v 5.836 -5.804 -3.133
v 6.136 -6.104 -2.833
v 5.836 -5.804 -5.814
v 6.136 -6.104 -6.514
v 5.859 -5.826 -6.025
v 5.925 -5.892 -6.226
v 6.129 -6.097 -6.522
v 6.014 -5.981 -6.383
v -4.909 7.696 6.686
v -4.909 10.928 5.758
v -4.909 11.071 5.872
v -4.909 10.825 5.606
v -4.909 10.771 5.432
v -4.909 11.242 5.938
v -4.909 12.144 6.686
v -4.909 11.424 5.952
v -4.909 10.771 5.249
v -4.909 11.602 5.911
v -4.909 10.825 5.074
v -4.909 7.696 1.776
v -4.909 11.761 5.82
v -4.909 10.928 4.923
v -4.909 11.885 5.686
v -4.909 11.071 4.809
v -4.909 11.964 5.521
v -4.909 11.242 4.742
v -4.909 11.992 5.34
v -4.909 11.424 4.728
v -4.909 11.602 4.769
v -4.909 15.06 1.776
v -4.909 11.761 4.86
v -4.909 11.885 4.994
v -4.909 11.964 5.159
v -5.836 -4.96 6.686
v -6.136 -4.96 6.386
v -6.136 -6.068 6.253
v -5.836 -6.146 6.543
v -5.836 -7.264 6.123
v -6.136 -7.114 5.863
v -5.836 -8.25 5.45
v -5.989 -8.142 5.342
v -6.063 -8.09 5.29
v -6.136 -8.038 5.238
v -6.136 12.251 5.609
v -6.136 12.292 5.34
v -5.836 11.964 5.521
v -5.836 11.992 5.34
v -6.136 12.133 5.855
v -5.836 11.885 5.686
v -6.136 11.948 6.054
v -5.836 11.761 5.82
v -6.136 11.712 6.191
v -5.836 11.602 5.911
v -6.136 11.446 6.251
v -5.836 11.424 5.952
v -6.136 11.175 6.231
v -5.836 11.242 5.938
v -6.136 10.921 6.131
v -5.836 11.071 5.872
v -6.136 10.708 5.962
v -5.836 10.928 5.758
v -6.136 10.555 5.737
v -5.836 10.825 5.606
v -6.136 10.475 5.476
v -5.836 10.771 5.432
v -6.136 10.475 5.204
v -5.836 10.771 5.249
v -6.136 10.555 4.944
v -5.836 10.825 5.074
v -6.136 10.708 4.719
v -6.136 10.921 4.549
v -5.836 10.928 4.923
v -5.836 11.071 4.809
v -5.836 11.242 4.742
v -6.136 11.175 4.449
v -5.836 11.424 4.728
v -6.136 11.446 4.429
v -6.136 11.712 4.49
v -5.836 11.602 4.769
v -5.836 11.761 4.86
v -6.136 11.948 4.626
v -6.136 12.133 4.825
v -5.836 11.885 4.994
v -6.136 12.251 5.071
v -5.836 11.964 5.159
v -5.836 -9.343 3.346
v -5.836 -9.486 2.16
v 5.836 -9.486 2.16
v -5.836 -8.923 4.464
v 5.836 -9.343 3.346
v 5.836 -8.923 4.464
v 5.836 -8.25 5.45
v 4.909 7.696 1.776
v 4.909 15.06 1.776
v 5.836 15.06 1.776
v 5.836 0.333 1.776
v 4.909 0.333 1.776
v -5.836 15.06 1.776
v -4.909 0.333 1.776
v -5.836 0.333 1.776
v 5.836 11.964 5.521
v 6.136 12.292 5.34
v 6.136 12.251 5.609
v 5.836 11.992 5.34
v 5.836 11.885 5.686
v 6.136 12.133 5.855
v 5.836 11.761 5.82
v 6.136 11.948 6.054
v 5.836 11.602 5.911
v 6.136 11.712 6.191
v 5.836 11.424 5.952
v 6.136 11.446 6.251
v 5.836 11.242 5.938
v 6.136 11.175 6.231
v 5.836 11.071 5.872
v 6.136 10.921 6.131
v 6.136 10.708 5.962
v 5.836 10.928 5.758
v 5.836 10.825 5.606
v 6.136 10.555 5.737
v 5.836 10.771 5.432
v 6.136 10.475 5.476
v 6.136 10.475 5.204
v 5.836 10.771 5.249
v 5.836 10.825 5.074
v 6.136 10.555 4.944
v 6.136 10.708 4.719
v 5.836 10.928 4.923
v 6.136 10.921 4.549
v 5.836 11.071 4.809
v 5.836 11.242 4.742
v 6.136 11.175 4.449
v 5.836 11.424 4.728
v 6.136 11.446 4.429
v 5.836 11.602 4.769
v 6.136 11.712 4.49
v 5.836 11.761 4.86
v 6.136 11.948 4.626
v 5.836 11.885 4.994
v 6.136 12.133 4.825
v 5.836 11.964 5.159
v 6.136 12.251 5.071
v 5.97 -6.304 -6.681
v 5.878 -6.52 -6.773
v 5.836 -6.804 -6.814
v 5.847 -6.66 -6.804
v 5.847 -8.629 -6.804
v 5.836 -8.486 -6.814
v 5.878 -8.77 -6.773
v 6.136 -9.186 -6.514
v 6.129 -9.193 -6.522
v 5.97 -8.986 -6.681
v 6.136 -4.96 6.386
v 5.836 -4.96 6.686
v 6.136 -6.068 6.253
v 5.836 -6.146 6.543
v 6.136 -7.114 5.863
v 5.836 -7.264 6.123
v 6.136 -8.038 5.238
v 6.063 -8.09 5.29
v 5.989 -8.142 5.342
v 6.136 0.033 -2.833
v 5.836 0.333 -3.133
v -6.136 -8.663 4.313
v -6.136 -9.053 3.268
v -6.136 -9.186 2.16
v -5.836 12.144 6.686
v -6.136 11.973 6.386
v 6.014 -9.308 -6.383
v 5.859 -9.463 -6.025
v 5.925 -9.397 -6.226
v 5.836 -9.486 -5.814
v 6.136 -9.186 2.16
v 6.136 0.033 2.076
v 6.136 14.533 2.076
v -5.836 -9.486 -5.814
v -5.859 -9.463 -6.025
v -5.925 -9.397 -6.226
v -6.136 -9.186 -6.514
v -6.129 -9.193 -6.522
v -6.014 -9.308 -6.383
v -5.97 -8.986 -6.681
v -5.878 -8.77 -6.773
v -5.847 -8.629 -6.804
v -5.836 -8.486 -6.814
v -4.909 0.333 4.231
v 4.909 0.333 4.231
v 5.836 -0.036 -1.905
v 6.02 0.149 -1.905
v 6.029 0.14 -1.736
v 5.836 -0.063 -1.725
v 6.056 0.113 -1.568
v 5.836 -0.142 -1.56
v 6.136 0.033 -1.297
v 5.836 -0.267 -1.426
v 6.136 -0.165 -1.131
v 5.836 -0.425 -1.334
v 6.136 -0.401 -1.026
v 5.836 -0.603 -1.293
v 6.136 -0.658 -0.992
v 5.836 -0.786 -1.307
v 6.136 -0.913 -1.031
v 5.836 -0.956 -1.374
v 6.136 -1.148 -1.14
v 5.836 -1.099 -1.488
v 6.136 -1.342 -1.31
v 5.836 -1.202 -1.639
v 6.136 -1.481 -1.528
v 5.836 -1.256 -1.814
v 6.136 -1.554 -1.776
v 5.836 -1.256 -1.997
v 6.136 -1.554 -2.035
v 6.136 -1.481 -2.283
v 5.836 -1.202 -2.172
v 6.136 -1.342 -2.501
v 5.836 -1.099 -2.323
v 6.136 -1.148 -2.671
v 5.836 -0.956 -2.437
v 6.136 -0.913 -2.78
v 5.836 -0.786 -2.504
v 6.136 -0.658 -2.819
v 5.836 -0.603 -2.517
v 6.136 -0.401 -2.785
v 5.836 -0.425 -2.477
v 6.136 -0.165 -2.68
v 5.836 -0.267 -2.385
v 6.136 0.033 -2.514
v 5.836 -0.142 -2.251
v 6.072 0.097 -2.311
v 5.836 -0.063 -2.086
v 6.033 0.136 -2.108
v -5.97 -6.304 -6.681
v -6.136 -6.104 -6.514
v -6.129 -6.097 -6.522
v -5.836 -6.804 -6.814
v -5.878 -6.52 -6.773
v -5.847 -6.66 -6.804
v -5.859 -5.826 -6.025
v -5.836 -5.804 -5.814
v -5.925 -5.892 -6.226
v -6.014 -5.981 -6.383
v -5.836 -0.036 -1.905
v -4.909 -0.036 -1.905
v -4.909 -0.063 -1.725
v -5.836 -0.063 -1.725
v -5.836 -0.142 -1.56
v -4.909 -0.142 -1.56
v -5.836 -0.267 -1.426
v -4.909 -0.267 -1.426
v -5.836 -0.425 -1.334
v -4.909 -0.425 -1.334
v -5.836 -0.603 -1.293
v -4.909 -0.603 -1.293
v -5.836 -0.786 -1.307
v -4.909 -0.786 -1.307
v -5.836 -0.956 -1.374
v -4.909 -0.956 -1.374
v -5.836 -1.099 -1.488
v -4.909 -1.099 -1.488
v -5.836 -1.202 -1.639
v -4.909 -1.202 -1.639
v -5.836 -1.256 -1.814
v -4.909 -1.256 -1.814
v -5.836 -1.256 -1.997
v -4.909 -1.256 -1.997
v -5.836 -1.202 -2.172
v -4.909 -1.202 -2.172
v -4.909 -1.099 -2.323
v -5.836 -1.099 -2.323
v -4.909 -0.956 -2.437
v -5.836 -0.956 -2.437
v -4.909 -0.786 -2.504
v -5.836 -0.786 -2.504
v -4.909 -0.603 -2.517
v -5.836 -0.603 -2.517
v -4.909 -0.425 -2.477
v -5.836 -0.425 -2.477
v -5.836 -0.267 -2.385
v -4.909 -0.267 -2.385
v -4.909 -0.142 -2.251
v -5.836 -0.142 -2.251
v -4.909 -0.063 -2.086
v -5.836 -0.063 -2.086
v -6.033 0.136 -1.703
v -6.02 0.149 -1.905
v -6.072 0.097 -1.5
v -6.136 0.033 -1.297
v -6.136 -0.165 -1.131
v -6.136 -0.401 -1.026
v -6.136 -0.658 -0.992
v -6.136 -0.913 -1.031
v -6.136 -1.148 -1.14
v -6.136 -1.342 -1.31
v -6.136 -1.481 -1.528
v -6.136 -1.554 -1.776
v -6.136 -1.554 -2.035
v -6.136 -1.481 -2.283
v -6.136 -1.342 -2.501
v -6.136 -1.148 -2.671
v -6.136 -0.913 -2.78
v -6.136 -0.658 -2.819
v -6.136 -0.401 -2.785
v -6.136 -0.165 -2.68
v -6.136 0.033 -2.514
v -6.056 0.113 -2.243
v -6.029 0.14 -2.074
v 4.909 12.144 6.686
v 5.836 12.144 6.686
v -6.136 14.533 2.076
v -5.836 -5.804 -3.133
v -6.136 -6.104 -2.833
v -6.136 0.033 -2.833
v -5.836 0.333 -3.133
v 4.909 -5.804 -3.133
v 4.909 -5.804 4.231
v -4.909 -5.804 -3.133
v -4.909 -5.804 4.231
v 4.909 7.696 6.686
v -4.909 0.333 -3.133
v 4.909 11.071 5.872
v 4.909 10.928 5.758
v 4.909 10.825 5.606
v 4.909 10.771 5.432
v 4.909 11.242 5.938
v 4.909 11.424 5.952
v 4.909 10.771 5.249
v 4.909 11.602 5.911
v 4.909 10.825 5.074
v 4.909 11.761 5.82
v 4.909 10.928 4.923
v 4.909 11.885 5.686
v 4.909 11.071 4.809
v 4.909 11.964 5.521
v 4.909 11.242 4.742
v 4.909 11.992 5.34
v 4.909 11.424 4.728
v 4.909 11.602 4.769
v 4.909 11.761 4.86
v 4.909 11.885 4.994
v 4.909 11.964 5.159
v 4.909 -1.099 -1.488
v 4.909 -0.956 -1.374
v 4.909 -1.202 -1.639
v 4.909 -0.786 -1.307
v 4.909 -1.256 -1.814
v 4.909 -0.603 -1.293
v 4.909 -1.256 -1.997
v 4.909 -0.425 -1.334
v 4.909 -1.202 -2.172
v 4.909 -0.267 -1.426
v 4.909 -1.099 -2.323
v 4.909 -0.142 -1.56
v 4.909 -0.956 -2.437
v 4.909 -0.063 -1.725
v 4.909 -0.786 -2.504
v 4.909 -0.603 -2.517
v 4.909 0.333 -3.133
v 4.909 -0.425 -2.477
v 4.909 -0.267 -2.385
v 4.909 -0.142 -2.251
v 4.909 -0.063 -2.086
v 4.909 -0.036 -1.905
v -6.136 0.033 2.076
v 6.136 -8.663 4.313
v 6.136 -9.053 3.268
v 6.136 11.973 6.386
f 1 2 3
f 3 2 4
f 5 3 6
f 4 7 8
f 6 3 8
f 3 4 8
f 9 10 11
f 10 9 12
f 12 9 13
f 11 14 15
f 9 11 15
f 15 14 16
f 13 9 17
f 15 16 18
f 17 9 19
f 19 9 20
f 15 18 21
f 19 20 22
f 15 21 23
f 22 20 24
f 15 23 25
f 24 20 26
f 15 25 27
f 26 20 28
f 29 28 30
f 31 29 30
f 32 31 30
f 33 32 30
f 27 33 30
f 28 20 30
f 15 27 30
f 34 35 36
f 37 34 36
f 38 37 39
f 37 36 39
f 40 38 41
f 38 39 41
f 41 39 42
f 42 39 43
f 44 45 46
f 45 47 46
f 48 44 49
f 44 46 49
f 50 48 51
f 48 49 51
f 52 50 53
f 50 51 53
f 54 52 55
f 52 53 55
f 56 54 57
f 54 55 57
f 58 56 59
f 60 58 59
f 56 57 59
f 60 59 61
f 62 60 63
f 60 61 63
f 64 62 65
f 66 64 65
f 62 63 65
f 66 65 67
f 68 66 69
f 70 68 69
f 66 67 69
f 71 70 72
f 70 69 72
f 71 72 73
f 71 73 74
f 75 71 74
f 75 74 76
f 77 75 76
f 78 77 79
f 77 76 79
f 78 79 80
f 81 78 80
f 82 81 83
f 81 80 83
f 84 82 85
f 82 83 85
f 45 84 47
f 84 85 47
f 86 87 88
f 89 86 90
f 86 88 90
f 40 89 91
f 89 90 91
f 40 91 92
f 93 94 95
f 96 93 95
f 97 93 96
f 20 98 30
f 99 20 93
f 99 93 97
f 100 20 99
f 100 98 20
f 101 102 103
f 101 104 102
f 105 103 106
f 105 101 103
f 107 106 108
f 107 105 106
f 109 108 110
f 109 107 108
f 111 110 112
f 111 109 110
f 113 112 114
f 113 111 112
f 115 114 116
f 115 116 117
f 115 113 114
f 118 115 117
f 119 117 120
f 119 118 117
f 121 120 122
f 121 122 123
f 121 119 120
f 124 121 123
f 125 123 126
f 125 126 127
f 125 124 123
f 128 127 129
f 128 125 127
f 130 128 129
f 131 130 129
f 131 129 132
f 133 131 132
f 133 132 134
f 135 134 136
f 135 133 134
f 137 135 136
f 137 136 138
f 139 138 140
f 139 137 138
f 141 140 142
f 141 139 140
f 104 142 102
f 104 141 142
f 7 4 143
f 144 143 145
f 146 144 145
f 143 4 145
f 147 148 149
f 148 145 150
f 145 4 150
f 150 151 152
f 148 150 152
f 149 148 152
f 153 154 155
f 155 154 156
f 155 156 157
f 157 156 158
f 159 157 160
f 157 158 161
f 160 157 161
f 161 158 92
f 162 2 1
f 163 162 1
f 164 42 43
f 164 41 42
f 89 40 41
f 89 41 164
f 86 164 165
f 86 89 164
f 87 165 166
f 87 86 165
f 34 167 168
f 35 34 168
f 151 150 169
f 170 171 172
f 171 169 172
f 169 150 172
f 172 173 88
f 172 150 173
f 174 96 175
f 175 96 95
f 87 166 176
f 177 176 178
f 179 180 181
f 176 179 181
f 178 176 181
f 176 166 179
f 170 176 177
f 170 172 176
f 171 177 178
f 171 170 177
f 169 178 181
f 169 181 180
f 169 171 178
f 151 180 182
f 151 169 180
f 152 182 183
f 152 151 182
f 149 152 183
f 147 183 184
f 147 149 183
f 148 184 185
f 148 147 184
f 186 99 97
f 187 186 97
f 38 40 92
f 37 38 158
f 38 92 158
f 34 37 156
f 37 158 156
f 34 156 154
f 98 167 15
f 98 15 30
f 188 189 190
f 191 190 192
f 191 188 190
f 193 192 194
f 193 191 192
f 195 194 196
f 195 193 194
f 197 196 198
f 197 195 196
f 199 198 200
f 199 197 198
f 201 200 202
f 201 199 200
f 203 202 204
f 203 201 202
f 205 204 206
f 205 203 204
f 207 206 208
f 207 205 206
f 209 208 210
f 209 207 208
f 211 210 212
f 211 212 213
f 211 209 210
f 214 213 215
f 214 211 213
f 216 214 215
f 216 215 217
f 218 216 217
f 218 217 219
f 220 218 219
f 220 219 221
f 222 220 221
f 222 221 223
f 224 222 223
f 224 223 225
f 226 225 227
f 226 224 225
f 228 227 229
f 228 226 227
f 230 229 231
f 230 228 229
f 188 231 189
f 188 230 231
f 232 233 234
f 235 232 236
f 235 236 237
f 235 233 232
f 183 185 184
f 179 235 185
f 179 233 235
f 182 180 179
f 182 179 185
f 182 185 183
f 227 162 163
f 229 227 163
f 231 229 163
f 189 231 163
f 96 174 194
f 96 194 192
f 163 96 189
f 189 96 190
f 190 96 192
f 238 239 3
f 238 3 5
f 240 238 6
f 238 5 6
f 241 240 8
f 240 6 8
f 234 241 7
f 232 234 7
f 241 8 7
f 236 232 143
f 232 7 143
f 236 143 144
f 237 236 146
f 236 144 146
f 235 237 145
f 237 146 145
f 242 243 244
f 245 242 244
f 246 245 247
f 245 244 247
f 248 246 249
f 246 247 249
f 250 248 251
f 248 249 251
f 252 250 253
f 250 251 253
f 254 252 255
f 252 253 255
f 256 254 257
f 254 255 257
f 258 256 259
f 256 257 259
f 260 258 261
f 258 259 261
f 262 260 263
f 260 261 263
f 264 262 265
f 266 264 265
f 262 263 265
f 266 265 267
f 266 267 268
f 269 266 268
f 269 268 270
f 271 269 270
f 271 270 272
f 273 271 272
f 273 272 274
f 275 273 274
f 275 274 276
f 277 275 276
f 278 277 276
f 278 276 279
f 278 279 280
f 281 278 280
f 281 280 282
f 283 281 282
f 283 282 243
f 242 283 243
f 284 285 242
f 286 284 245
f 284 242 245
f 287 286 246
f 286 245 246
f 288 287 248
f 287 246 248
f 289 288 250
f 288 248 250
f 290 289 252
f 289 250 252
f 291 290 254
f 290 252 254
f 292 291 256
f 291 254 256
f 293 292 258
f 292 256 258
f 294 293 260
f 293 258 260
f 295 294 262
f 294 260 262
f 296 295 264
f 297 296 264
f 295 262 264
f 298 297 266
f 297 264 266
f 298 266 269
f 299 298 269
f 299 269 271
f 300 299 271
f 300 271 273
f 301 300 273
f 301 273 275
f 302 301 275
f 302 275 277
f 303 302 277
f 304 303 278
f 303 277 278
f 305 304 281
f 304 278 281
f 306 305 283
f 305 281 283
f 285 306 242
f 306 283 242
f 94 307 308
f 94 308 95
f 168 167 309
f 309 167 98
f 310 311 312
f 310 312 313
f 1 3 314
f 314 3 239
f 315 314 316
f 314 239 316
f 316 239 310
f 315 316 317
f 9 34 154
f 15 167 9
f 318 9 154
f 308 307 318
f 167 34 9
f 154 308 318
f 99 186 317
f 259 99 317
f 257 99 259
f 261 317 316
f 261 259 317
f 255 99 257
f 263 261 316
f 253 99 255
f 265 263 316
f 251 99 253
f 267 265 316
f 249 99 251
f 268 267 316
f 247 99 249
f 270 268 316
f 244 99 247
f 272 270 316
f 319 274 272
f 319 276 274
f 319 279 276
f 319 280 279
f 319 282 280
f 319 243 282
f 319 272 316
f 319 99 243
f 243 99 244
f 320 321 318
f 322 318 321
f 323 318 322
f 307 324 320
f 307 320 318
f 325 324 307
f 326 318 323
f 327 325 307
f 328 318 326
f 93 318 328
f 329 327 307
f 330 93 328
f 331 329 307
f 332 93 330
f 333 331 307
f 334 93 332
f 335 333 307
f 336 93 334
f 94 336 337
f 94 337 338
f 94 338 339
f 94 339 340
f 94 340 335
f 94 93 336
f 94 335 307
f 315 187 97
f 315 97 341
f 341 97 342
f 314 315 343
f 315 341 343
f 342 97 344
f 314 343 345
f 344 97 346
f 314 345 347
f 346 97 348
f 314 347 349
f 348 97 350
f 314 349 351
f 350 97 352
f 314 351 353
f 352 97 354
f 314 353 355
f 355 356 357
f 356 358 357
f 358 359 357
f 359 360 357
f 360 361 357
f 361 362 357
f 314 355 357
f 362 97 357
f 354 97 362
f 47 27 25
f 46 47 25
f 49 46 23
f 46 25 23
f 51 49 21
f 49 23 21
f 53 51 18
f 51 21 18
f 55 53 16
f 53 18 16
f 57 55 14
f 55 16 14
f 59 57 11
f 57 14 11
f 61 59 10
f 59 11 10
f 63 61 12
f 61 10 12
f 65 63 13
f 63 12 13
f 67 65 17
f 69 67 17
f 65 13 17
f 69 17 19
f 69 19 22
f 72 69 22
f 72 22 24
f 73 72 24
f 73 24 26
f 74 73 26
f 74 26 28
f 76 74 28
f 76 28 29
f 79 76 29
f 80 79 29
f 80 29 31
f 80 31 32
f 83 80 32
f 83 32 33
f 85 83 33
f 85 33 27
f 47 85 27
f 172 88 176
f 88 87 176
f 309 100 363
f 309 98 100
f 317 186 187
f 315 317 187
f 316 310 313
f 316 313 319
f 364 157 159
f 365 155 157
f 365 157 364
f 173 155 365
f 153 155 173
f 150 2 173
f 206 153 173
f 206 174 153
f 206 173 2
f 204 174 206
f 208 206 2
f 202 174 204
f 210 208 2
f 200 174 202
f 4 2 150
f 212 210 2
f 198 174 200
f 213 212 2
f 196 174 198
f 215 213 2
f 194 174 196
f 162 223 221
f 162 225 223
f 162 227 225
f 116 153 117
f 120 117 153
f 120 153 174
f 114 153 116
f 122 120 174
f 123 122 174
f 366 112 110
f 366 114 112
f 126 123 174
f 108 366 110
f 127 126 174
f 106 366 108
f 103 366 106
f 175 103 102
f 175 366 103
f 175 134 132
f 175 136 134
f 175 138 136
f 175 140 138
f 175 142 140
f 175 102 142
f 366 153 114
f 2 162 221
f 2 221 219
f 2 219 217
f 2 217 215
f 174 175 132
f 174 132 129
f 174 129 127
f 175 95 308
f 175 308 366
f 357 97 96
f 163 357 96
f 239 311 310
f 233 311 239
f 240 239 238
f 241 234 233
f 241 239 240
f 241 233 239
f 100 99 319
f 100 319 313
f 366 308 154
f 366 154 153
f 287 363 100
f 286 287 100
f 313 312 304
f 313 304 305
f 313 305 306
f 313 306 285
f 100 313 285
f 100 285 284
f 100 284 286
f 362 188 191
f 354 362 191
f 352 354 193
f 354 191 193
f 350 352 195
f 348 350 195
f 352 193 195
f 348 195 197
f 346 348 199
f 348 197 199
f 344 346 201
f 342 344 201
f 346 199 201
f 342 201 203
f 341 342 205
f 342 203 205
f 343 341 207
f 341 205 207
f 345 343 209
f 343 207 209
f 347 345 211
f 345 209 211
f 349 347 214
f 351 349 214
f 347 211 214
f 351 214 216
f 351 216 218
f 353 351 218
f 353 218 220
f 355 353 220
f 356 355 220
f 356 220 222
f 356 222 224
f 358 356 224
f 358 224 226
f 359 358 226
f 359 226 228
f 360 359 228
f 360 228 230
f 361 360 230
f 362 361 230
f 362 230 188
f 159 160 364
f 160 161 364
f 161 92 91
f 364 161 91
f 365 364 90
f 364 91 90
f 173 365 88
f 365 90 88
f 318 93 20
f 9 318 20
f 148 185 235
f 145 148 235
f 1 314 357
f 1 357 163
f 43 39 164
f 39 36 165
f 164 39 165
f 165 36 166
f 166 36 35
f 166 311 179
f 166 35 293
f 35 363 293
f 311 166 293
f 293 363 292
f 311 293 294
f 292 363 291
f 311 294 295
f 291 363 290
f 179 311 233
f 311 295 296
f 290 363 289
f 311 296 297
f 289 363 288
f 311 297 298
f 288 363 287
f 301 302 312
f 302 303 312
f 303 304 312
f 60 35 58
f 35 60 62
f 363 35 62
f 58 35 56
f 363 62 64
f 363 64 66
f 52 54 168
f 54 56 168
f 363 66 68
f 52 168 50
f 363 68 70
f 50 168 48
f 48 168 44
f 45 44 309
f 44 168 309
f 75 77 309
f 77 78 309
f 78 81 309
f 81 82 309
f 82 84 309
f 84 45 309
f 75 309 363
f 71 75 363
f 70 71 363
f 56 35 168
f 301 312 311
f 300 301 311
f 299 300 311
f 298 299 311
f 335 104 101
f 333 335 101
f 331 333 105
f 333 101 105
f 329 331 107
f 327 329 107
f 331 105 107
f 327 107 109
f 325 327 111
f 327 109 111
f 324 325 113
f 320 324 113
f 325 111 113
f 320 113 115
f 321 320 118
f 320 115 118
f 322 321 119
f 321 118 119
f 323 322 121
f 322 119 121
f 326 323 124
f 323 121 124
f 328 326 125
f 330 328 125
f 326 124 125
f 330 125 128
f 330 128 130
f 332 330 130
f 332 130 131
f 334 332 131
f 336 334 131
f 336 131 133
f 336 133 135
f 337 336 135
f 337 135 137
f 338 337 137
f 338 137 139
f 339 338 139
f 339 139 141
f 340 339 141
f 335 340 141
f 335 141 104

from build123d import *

# Parameters (mm, degrees)
SKETCH_1_W                = 5
SKETCH_1_H                = 10
EXTRUDE_1_DEPTH           = 4
CUT_EXTRUDE_1_DEPTH       = 9.124038405
CUT_EXTRUDE_1_DEPTH_BACK  = 9.124038405
CUT_EXTRUDE_2_DEPTH       = 9.124038405
CUT_EXTRUDE_2_DEPTH_BACK  = 9.124038405
SKETCH_6_W                = 4
SKETCH_6_H                = 3
CUT_EXTRUDE_3_DEPTH       = 2.5
SKETCH_7_W                = 4
SKETCH_7_H                = 3
CUT_EXTRUDE_4_DEPTH       = 2.5
CUT_EXTRUDE_5_DEPTH       = 9.124038405
CUT_EXTRUDE_5_DEPTH_BACK  = 9.124038405
CUT_EXTRUDE_10_DEPTH      = 9.124038405
CUT_EXTRUDE_10_DEPTH_BACK = 5
SKETCH_11_R               = 0.25
CUT_EXTRUDE_11_DEPTH      = 5
SKETCH_12_R               = 0.25
CUT_EXTRUDE_12_DEPTH      = 5
EXTRUDE_3_DEPTH           = 5
SCALE_1_SCALE             = 2.454545455
FILLET_1_R                = 5
CHAMFER_1_SIZE            = 0.3
FILLET_2_R                = 1


with BuildPart() as part:
    # 草图1 → 凸台-拉伸1 (new body)
    with BuildSketch(Plane.XY):
        Rectangle(SKETCH_1_W, SKETCH_1_H)
    extrude(amount=EXTRUDE_1_DEPTH)

    # 草图2 → 切除-拉伸1 (cut, two sides: drawn at the far end of the back side and taken through both)
    with BuildSketch(Plane(origin=(2.5, 0, 0), x_dir=(0, 0, -1), z_dir=(1, 0, 0)).offset(-CUT_EXTRUDE_1_DEPTH_BACK)):
        Polygon((-30.132775887, -11.712260262), (-4, 3.811901084), (-2, 5), (24.132775887, 20.524161347), (-6.915546806, 72.789713121), (-61.181098581, 40.553291512), align=None)
    extrude(amount=CUT_EXTRUDE_1_DEPTH + CUT_EXTRUDE_1_DEPTH_BACK, mode=Mode.SUBTRACT)

    # 草图3 → 切除-拉伸2 (cut, two sides: drawn at the far end of the back side and taken through both)
    with BuildSketch(Plane(origin=(2.5, 0, 0), x_dir=(0, 0, -1), z_dir=(1, 0, 0)).offset(-CUT_EXTRUDE_2_DEPTH_BACK)):
        Polygon((-2, 35.396078054), (-2, 5), (-2, -1), (0, -1), (30.396078054, -1), (75.805427436, 39.418773275), (43.409349382, 75.814851329), align=None)
    extrude(amount=CUT_EXTRUDE_2_DEPTH + CUT_EXTRUDE_2_DEPTH_BACK, mode=Mode.SUBTRACT)

    # 草图6 → 切除-拉伸3 (cut)
    with BuildSketch(Plane(origin=(0, -1, 0), x_dir=(1, 0, 0), z_dir=(0, 1, 0))):
        with Locations((0, -1.5)):
            Rectangle(SKETCH_6_W, SKETCH_6_H)
    extrude(amount=-CUT_EXTRUDE_3_DEPTH, mode=Mode.SUBTRACT)

    # 草图7 → 切除-拉伸4 (cut)
    with BuildSketch(Plane(origin=(0, 0, 2), x_dir=(-1, 0, 0), z_dir=(0, 0, -1))):
        with Locations((0, 3.5)):
            Rectangle(SKETCH_7_W, SKETCH_7_H)
    extrude(amount=-CUT_EXTRUDE_4_DEPTH, mode=Mode.SUBTRACT)

    # 草图8 → 切除-拉伸5 (cut, two sides: drawn at the far end of the back side and taken through both)
    with BuildSketch(Plane(origin=(2.5, 0, 0), x_dir=(0, 0, -1), z_dir=(1, 0, 0)).offset(-CUT_EXTRUDE_5_DEPTH_BACK)):
        Polygon((-25.835890872, 17.835890872), (-4, -4), (-3, -5), (18.835890872, -26.835890872), (-24.835890872, -70.507672616), (-69.507672616, -25.835890872), align=None)
    extrude(amount=CUT_EXTRUDE_5_DEPTH + CUT_EXTRUDE_5_DEPTH_BACK, mode=Mode.SUBTRACT)

    # 草图9 → 切除-拉伸10 (cut, two sides: drawn at the far end of the back side and taken through both)
    with BuildSketch(Plane(origin=(2.5, 0, 0), x_dir=(0, 0, -1), z_dir=(1, 0, 0)).offset(-CUT_EXTRUDE_10_DEPTH_BACK)):
        Polygon((-23.148447549, -26.648447549), (-1.5, -5), (0, -3.5), (21.648447549, 18.148447549), (64.945342647, -25.148447549), (20.148447549, -69.945342647), align=None)
    extrude(amount=CUT_EXTRUDE_10_DEPTH + CUT_EXTRUDE_10_DEPTH_BACK, mode=Mode.SUBTRACT)

    # 草图11 → 切除-拉伸11 (cut)
    with BuildSketch(Plane(origin=(2.5, 0, 0), x_dir=(0, 0, -1), z_dir=(1, 0, 0))):
        with Locations(Location((-3.451895846, 3.5, 0), (0, 0, 90))):
            Circle(SKETCH_11_R)
    extrude(amount=-CUT_EXTRUDE_11_DEPTH, mode=Mode.SUBTRACT)

    # 草图12 → 切除-拉伸12 (cut)
    with BuildSketch(Plane(origin=(2.5, 0, 0), x_dir=(0, 0, -1), z_dir=(1, 0, 0))):
        with Locations(Location((-0.5, -1.4, 0), (0, 0, 90))):
            Circle(SKETCH_12_R)
    extrude(amount=-CUT_EXTRUDE_12_DEPTH, mode=Mode.SUBTRACT)

    # 草图14 → 凸台-拉伸3 (add)
    with BuildSketch(Plane.ZY.offset(2.5)):
        Polygon((1.5, -5), (-1.5, -5), (-1.5, -3.5), (0, -3.5), align=None)
    extrude(amount=-EXTRUDE_3_DEPTH)


with BuildPart() as part_1:
    # 缩放比例1: scaled about (0, -1.916171136, 2.153711166)
    add(part.part.scale(SCALE_1_SCALE).moved(Location((0, 2.787158016, -3.132670787))))

    # 圆角1
    # the kernel refuses this fillet: 5 mm, written as the material it takes off along each edge
    with BuildSketch(Plane(origin=(11.314033166, -9.485569257, 4.230965577), x_dir=(0, 0.7071067811865475, 0.7071067811865475), z_dir=(-1, 0, 0))) as fillet_1_piece_1:
        with BuildLine():
            CenterArc((FILLET_1_R * 0.414213562373, FILLET_1_R), FILLET_1_R, 225, 45)
            Line((-FILLET_1_R * 0.292893218813, FILLET_1_R * 0.292893218813), (0, 0))
            Line((0, 0), (FILLET_1_R * 0.414213562373, 0))
        make_face()
    extrude(amount=22.628066332, mode=Mode.SUBTRACT)
    with BuildSketch(Plane(origin=(11.314033166, -7.031023802, 6.685511031), x_dir=(0, -0.7071067811865476, -0.7071067811865476), z_dir=(-1, 0, 0))) as fillet_1_piece_2:
        with BuildLine():
            CenterArc((FILLET_1_R * 0.414213562373, -FILLET_1_R), FILLET_1_R, 90, 45)
            Line((-FILLET_1_R * 0.292893218813, -FILLET_1_R * 0.292893218813), (0, 0))
            Line((0, 0), (FILLET_1_R * 0.414213562373, 0))
        make_face()
    extrude(amount=22.628066332, mode=Mode.SUBTRACT)

    # 倒角1
    # the kernel refuses this chamfer: 0.3 mm, written as the material it takes off along each edge
    with BuildSketch(Plane(origin=(6.136363636, -4.95995599, 6.685511031), x_dir=(-0.9996219169112968, 0, 0.027495876610587344), z_dir=(0, 1, 0)), Plane(origin=(-6.136363636, 12.915147392, 6.685511031), x_dir=(0.9996219169112968, 0, 0.027495876610587344), z_dir=(0, -1, 0))) as chamfer_1_piece_1:
        Polygon((CHAMFER_1_SIZE * 0.999621916911, -CHAMFER_1_SIZE * 0.0274958766106), (-CHAMFER_1_SIZE * 0.0274958766106, -CHAMFER_1_SIZE * 0.999621916911), (0, 0), align=None)
    extrude(amount=17.875103383, mode=Mode.SUBTRACT)
    with BuildSketch(Plane(origin=(6.136363636, 15.831390185, 1.776420122), x_dir=(-0.9996219169112968, 0, -0.027495876610586622), z_dir=(0, -1, 0)), Plane(origin=(-6.136363636, 0.332612561, 1.776420122), x_dir=(0.9996219169112965, 0, -0.027495876610589495), z_dir=(0, 1, 0))) as chamfer_1_piece_2:
        Polygon((CHAMFER_1_SIZE * 0.999621916911, -CHAMFER_1_SIZE * 0.0274958766106), (-CHAMFER_1_SIZE * 0.0274958766106, -CHAMFER_1_SIZE * 0.999621916911), (0, 0), align=None)
    extrude(amount=15.498777624, mode=Mode.SUBTRACT)
    with BuildSketch(Plane(origin=(6.136363636, 0.332612561, 1.776420122), x_dir=(0.02749587661059016, -0.9996219169112965, 0), z_dir=(0, 0, -1)), Plane(origin=(-6.136363636, 0.332612561, -3.904175683), x_dir=(-0.027495876610587448, -0.9996219169112968, 0), z_dir=(0, 0, 1))) as chamfer_1_piece_3:
        Polygon((CHAMFER_1_SIZE * 0.999621916911, CHAMFER_1_SIZE * 0.0274958766106), (-CHAMFER_1_SIZE * 0.0274958766106, CHAMFER_1_SIZE * 0.999621916911), (0, 0), align=None)
    extrude(amount=5.680595805, mode=Mode.SUBTRACT)
    with BuildSketch(Plane(origin=(6.136363636, -5.803751075, -3.132670787), x_dir=(0.027495876610587378, 0, 0.9996219169112965), z_dir=(0, 1, 0)), Plane(origin=(-6.136363636, 1.104117458, -3.132670787), x_dir=(-0.027495876610587378, 0, 0.9996219169112965), z_dir=(0, -1, 0))) as chamfer_1_piece_4:
        Polygon((CHAMFER_1_SIZE * 0.999621916911, -CHAMFER_1_SIZE * 0.0274958766106), (-CHAMFER_1_SIZE * 0.0274958766106, -CHAMFER_1_SIZE * 0.999621916911), (0, 0), align=None)
    extrude(amount=6.907868533, mode=Mode.SUBTRACT)
    with BuildSketch(Plane(origin=(-6.136363636, -5.803751075, -7.585993865), x_dir=(-0.027495876610587264, -0.9996219169112968, 0), z_dir=(0, 0, 1))) as chamfer_1_piece_5:
        Polygon((CHAMFER_1_SIZE * 0.999621916911, CHAMFER_1_SIZE * 0.0274958766106), (-CHAMFER_1_SIZE * 0.0274958766106, CHAMFER_1_SIZE * 0.999621916911), (0, 0), align=None)
    extrude(amount=4.453323078, mode=Mode.SUBTRACT)
    with BuildSketch(Plane(origin=(6.136363636, -5.803751075, -7.585993865), x_dir=(0.027495876610587264, -0.9996219169112968, 0), z_dir=(0, 0, 1))) as chamfer_1_piece_6:
        Polygon((CHAMFER_1_SIZE * 0.999621916911, -CHAMFER_1_SIZE * 0.0274958766106), (-CHAMFER_1_SIZE * 0.0274958766106, -CHAMFER_1_SIZE * 0.999621916911), (0, 0), align=None)
    extrude(amount=4.453323078, mode=Mode.SUBTRACT)
    with BuildSketch(Plane(origin=(-6.136363636, -10.257074153, -6.814488969), x_dir=(-0.027495876610587344, 0, 0.9996219169112968), z_dir=(0, 1, 0))) as chamfer_1_piece_7:
        Polygon((CHAMFER_1_SIZE * 0.999621916911, CHAMFER_1_SIZE * 0.0274958766106), (-CHAMFER_1_SIZE * 0.0274958766106, CHAMFER_1_SIZE * 0.999621916911), (0, 0), align=None)
    extrude(amount=5.224827975, mode=Mode.SUBTRACT)
    with BuildSketch(Plane(origin=(6.136363636, -10.257074153, -6.814488969), x_dir=(0.027495876610587344, 0, 0.9996219169112968), z_dir=(0, 1, 0))) as chamfer_1_piece_8:
        Polygon((CHAMFER_1_SIZE * 0.999621916911, -CHAMFER_1_SIZE * 0.0274958766106), (-CHAMFER_1_SIZE * 0.0274958766106, -CHAMFER_1_SIZE * 0.999621916911), (0, 0), align=None)
    extrude(amount=5.224827975, mode=Mode.SUBTRACT)
    with BuildSketch(Plane(origin=(6.136363636, -9.485569257, 2.159897765), x_dir=(0.027495876610587344, 0.9996219169112968, 0), z_dir=(0, 0, -1)), Plane(origin=(-6.136363636, -9.485569257, -7.585993865), x_dir=(-0.027495876610587344, 0.9996219169112968, 0), z_dir=(0, 0, 1))) as chamfer_1_piece_9:
        Polygon((CHAMFER_1_SIZE * 0.999621916911, -CHAMFER_1_SIZE * 0.0274958766106), (-CHAMFER_1_SIZE * 0.0274958766106, -CHAMFER_1_SIZE * 0.999621916911), (0, 0), align=None)
    extrude(amount=9.74589163, mode=Mode.SUBTRACT)
    with BuildSketch(Plane(origin=(6.136363636, -4.485569257, 2.159897765), x_dir=(0, -0.642857600187849, 0.765985708666108), z_dir=(0, 0.765985708666108, 0.642857600187849))) as chamfer_1_piece_10:
        Polygon((5 - CHAMFER_1_SIZE, 0), (5, -CHAMFER_1_SIZE), (5, 0), align=None)
    revolve(axis=Axis((6.136363636, -4.485569257, 2.159897765), (1, 0, 0)), revolution_arc=49.994764907, mode=Mode.SUBTRACT)
    with BuildSketch(Plane(origin=(6.136363636, -4.95995599, 1.685511031), x_dir=(0, 0, 1), z_dir=(0, 1, 0))) as chamfer_1_piece_11:
        Polygon((5 - CHAMFER_1_SIZE, 0), (5, -CHAMFER_1_SIZE), (5, 0), align=None)
    revolve(axis=Axis((6.136363636, -4.95995599, 1.685511031), (1, 0, 0)), revolution_arc=49.994764907, mode=Mode.SUBTRACT)
    with BuildSketch(Plane(origin=(6.136363636, 11.378067107, 5.34016447), x_dir=(0, 1, 0), z_dir=(0, 0, -1))) as chamfer_1_piece_12:
        Polygon((0.613636364 + CHAMFER_1_SIZE, 0), (0.613636364, -CHAMFER_1_SIZE), (0.613636364, 0), align=None)
    revolve(axis=Axis((6.136363636, 11.378067107, 5.34016447), (1, 0, 0)), mode=Mode.SUBTRACT)
    with BuildSketch(Plane(origin=(6.136363636, -0.64920562, -1.90539806), x_dir=(0, 1, 0), z_dir=(0, 0, -1))) as chamfer_1_piece_13:
        Polygon((0.613636364 + CHAMFER_1_SIZE, 0), (0.613636364, -CHAMFER_1_SIZE), (0.613636364, 0), align=None)
    revolve(axis=Axis((6.136363636, -0.64920562, -1.90539806), (1, 0, 0)), mode=Mode.SUBTRACT)
    with BuildSketch(Plane(origin=(-6.136363636, -4.95995599, 1.685511031), x_dir=(0, 0, 1), z_dir=(0, 1, 0))) as chamfer_1_piece_14:
        Polygon((5, CHAMFER_1_SIZE), (5 - CHAMFER_1_SIZE, 0), (5, 0), align=None)
    revolve(axis=Axis((-6.136363636, -4.95995599, 1.685511031), (1, 0, 0)), revolution_arc=49.994764907, mode=Mode.SUBTRACT)
    with BuildSketch(Plane(origin=(-6.136363636, -4.485569257, 2.159897765), x_dir=(0, -0.6428576001878487, 0.7659857086661084), z_dir=(0, 0.7659857086661084, 0.6428576001878487))) as chamfer_1_piece_15:
        Polygon((5 - CHAMFER_1_SIZE, 0), (5, CHAMFER_1_SIZE), (5, 0), align=None)
    revolve(axis=Axis((-6.136363636, -4.485569257, 2.159897765), (1, 0, 0)), revolution_arc=49.994764907, mode=Mode.SUBTRACT)
    with BuildSketch(Plane(origin=(-6.136363636, 11.378067107, 5.34016447), x_dir=(0, 1, 0), z_dir=(0, 0, -1))) as chamfer_1_piece_16:
        Polygon((0.613636364 + CHAMFER_1_SIZE, 0), (0.613636364, CHAMFER_1_SIZE), (0.613636364, 0), align=None)
    revolve(axis=Axis((-6.136363636, 11.378067107, 5.34016447), (1, 0, 0)), mode=Mode.SUBTRACT)
    with BuildSketch(Plane(origin=(-6.136363636, -0.64920562, -1.90539806), x_dir=(0, 1, 0), z_dir=(0, 0, -1))) as chamfer_1_piece_17:
        Polygon((0.613636364 + CHAMFER_1_SIZE, 0), (0.613636364, CHAMFER_1_SIZE), (0.613636364, 0), align=None)
    revolve(axis=Axis((-6.136363636, -0.64920562, -1.90539806), (1, 0, 0)), mode=Mode.SUBTRACT)
    with BuildSketch(Plane(origin=(6.136363636, 11.749612501, 7.348805964), x_dir=(-0.9996219169112968, 0.023639351761111982, 0.014042944096554499), z_dir=(0, 0.5107290920540476, -0.8597417022162227)), Plane(origin=(-6.136363636, 15.453915284, 1.113125189), x_dir=(0.9996219169112968, 0.023639351761111344, 0.014042944096553983), z_dir=(0, -0.5107290920540476, 0.8597417022162227))) as chamfer_1_piece_18:
        Polygon((CHAMFER_1_SIZE * 0.999621916911, -CHAMFER_1_SIZE * 0.0274958766106), (-CHAMFER_1_SIZE * 0.0274958766106, -CHAMFER_1_SIZE * 0.999621916911), (0, 0), align=None)
    extrude(amount=7.252970001, mode=Mode.SUBTRACT)
    with BuildSketch(Plane(origin=(6.136363636, 15.831390185, 1.776420122), x_dir=(-0.9996219169112968, 0, -0.027495876610586622), z_dir=(0, -1, 0))) as chamfer_1_piece_19a_section:
        Polygon((CHAMFER_1_SIZE * 0.999621916911, -CHAMFER_1_SIZE * 0.0274958766106), (-CHAMFER_1_SIZE * 0.0274958766106, -CHAMFER_1_SIZE * 0.999621916911), (0, 0), align=None)
    chamfer_1_piece_19a = extrude(amount=16.27028252, mode=Mode.PRIVATE)
    chamfer_1_piece_19a = split(chamfer_1_piece_19a, bisect_by=Plane(origin=(6.037425548, 0.332612561, 1.87535821), z_dir=(0, -1, 0)), keep=Keep.TOP, mode=Mode.PRIVATE)
    with BuildSketch(Plane(origin=(6.136363636, 0.332612561, 2.547925019), x_dir=(0.027495876610587288, -0.9996219169112968, 0), z_dir=(0, 0, -1))) as chamfer_1_piece_19b_section:
        Polygon((CHAMFER_1_SIZE * 0.999621916911, CHAMFER_1_SIZE * 0.0274958766106), (-CHAMFER_1_SIZE * 0.0274958766106, CHAMFER_1_SIZE * 0.999621916911), (0, 0), align=None)
    chamfer_1_piece_19b = extrude(amount=6.452100702, mode=Mode.PRIVATE)
    chamfer_1_piece_19b = split(chamfer_1_piece_19b, bisect_by=Plane(origin=(6.037425548, 0.233674473, 1.776420122), z_dir=(0, 0, 1)), keep=Keep.TOP, mode=Mode.PRIVATE)
    chamfer_1_piece_19 = chamfer_1_piece_19a & chamfer_1_piece_19b
    add(chamfer_1_piece_19, mode=Mode.SUBTRACT)
    with BuildSketch(Plane(origin=(6.136363636, -6.575255971, -3.132670787), x_dir=(0.027495876610587378, 0, 0.9996219169112965), z_dir=(0, 1, 0))) as chamfer_1_piece_20a_section:
        Polygon((CHAMFER_1_SIZE * 0.999621916911, -CHAMFER_1_SIZE * 0.0274958766106), (-CHAMFER_1_SIZE * 0.0274958766106, -CHAMFER_1_SIZE * 0.999621916911), (0, 0), align=None)
    chamfer_1_piece_20a = extrude(amount=7.679373429, mode=Mode.PRIVATE)
    chamfer_1_piece_20a = split(chamfer_1_piece_20a, bisect_by=Plane(origin=(6.037425548, -5.803751075, -3.033732699), z_dir=(0, -1, 0)), keep=Keep.TOP, mode=Mode.PRIVATE)
    with BuildSketch(Plane(origin=(6.136363636, -5.803751075, -7.585993865), x_dir=(0.027495876610587264, -0.9996219169112968, 0), z_dir=(0, 0, 1))) as chamfer_1_piece_20b_section:
        Polygon((CHAMFER_1_SIZE * 0.999621916911, -CHAMFER_1_SIZE * 0.0274958766106), (-CHAMFER_1_SIZE * 0.0274958766106, -CHAMFER_1_SIZE * 0.999621916911), (0, 0), align=None)
    chamfer_1_piece_20b = extrude(amount=5.224827975, mode=Mode.PRIVATE)
    chamfer_1_piece_20b = split(chamfer_1_piece_20b, bisect_by=Plane(origin=(6.037425548, -5.902689163, -3.132670787), z_dir=(0, 0, 1)), keep=Keep.TOP, mode=Mode.PRIVATE)
    chamfer_1_piece_20 = chamfer_1_piece_20a & chamfer_1_piece_20b
    add(chamfer_1_piece_20, mode=Mode.SUBTRACT)
    with BuildSketch(Plane(origin=(-6.136363636, 1.104117458, -3.132670787), x_dir=(-0.027495876610587378, 0, 0.9996219169112965), z_dir=(0, -1, 0))) as chamfer_1_piece_21a_section:
        Polygon((CHAMFER_1_SIZE * 0.999621916911, -CHAMFER_1_SIZE * 0.0274958766106), (-CHAMFER_1_SIZE * 0.0274958766106, -CHAMFER_1_SIZE * 0.999621916911), (0, 0), align=None)
    chamfer_1_piece_21a = extrude(amount=7.679373429, mode=Mode.PRIVATE)
    chamfer_1_piece_21a = split(chamfer_1_piece_21a, bisect_by=Plane(origin=(-6.037425548, -5.803751075, -3.033732699), z_dir=(0, -1, 0)), keep=Keep.TOP, mode=Mode.PRIVATE)
    with BuildSketch(Plane(origin=(-6.136363636, -5.803751075, -7.585993865), x_dir=(-0.027495876610587264, -0.9996219169112968, 0), z_dir=(0, 0, 1))) as chamfer_1_piece_21b_section:
        Polygon((CHAMFER_1_SIZE * 0.999621916911, CHAMFER_1_SIZE * 0.0274958766106), (-CHAMFER_1_SIZE * 0.0274958766106, CHAMFER_1_SIZE * 0.999621916911), (0, 0), align=None)
    chamfer_1_piece_21b = extrude(amount=5.224827975, mode=Mode.PRIVATE)
    chamfer_1_piece_21b = split(chamfer_1_piece_21b, bisect_by=Plane(origin=(-6.037425548, -5.902689163, -3.132670787), z_dir=(0, 0, 1)), keep=Keep.TOP, mode=Mode.PRIVATE)
    chamfer_1_piece_21 = chamfer_1_piece_21a & chamfer_1_piece_21b
    add(chamfer_1_piece_21, mode=Mode.SUBTRACT)
    with BuildSketch(Plane(origin=(-6.136363636, -0.438892335, 1.776420122), x_dir=(0.9996219169112968, 0, -0.0274958766105867), z_dir=(0, 1, 0))) as chamfer_1_piece_22a_section:
        Polygon((CHAMFER_1_SIZE * 0.999621916911, -CHAMFER_1_SIZE * 0.0274958766106), (-CHAMFER_1_SIZE * 0.0274958766106, -CHAMFER_1_SIZE * 0.999621916911), (0, 0), align=None)
    chamfer_1_piece_22a = extrude(amount=16.27028252, mode=Mode.PRIVATE)
    chamfer_1_piece_22a = split(chamfer_1_piece_22a, bisect_by=Plane(origin=(-6.037425548, 0.332612561, 1.87535821), z_dir=(0, -1, 0)), keep=Keep.TOP, mode=Mode.PRIVATE)
    with BuildSketch(Plane(origin=(-6.136363636, 0.332612561, -3.904175683), x_dir=(-0.027495876610587448, -0.9996219169112968, 0), z_dir=(0, 0, 1))) as chamfer_1_piece_22b_section:
        Polygon((CHAMFER_1_SIZE * 0.999621916911, CHAMFER_1_SIZE * 0.0274958766106), (-CHAMFER_1_SIZE * 0.0274958766106, CHAMFER_1_SIZE * 0.999621916911), (0, 0), align=None)
    chamfer_1_piece_22b = extrude(amount=6.452100702, mode=Mode.PRIVATE)
    chamfer_1_piece_22b = split(chamfer_1_piece_22b, bisect_by=Plane(origin=(-6.037425548, 0.233674473, 1.776420122), z_dir=(0, 0, 1)), keep=Keep.TOP, mode=Mode.PRIVATE)
    chamfer_1_piece_22 = chamfer_1_piece_22a & chamfer_1_piece_22b
    add(chamfer_1_piece_22, mode=Mode.SUBTRACT)

    # 圆角2
    fillet_2_edges = [part_1.edges().sort_by_distance(p)[0] for p in [
        (0, -5.803751075, -6.814488969),
        (0, -9.485569257, -6.814488969),
    ]]
    fillet(fillet_2_edges, radius=FILLET_2_R)


solid = part_1.part
